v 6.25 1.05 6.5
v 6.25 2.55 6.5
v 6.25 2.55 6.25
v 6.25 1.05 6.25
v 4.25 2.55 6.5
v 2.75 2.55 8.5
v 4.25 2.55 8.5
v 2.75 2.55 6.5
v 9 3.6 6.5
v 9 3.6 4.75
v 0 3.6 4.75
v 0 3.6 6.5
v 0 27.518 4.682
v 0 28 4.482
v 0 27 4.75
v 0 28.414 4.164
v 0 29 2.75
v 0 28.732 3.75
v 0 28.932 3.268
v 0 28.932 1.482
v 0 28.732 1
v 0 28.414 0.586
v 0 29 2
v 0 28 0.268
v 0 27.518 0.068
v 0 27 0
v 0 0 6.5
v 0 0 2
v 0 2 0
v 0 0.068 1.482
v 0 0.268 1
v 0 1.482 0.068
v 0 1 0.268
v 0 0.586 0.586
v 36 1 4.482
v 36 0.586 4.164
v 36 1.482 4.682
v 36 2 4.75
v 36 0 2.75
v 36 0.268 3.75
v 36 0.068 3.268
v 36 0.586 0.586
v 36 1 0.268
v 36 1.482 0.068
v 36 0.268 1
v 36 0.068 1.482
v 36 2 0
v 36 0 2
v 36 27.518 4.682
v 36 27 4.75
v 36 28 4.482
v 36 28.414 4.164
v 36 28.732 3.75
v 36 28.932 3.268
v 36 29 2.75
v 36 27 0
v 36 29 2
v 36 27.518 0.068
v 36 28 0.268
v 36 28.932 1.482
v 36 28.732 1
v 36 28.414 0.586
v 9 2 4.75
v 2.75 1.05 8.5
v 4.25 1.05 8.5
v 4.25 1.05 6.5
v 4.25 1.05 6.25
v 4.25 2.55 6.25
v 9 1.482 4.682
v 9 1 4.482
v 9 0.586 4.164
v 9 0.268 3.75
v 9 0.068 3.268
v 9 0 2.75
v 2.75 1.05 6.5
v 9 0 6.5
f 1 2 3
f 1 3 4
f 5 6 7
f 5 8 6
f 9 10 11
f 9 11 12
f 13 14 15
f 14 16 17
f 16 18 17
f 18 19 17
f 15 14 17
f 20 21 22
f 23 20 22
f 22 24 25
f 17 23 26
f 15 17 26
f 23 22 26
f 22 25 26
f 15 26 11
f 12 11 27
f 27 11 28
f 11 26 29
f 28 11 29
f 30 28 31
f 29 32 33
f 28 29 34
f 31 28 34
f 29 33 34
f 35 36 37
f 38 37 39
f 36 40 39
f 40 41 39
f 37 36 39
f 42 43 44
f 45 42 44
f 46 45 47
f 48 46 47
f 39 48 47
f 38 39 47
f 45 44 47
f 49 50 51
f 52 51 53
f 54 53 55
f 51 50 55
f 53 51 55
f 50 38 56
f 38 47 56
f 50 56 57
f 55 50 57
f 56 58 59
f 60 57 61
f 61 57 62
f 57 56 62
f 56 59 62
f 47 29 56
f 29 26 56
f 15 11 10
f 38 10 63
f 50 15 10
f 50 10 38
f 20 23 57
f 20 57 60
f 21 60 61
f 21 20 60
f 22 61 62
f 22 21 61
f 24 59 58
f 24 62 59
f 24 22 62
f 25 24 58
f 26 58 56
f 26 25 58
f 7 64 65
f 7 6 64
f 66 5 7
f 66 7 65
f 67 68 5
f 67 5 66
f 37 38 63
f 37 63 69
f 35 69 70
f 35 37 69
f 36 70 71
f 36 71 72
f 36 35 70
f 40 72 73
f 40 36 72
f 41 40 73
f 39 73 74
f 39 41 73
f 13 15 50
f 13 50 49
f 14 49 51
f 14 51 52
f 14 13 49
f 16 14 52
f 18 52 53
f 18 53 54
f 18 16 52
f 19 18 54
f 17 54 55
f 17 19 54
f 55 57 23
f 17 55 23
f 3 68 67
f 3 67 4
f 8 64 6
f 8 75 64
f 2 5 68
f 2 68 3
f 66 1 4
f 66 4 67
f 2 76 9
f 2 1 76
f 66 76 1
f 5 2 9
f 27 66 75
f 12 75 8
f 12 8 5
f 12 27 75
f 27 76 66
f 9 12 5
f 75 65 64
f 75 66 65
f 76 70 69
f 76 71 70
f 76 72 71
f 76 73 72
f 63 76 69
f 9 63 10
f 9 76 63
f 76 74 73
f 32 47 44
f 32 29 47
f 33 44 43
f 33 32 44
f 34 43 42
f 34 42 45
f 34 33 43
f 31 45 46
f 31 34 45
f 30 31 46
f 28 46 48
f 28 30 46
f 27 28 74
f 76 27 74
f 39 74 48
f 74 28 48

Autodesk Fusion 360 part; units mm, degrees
sketch "Sketch1" plane through (0, 0, 0) normal (0, 1, 0) x (1, 0, 0)
box "BoxPrimitive1" add length 6.5 width 9 height 3.6 placed x (0, 0, 1) y (1, 0, 0) z (0, 1, 0) at (0, 0, 0)
sketch "Sketch2" plane through (0, 0, 6.5) normal (0, 0, 1) x (1, 0, 0)
  line L0 (0, 3.6) -> (0, 0)
  line L1 (0, 0) -> (9, 0)
  line L2 (9, 0) -> (9, 3.6)
  line L3 (9, 3.6) -> (0, 3.6)
  line L4 (4.5, 3.6) -> (4.5, 0)
  line L5 (4.5, 1.8) -> (6.25, 1.8)
  line L6 (6.25, 1.8) -> (6.25, 1.05)
  line L7 (6.25, 1.05) -> (2.75, 1.05)
  line L8 (2.75, 1.05) -> (2.75, 2.55)
  line L9 (2.75, 2.55) -> (6.25, 2.55)
  line L10 (6.25, 2.55) -> (6.25, 1.8)
  line L11 (2.75, 2.55) -> (4.25, 2.55)
  line L12 (4.25, 2.55) -> (4.25, 1.05)
  dimension "d6" = 1.75
  dimension "d7" = 0.75
  dimension "d8" = 3.5
  dimension "d9" = 1.5
  dimension "d10" = 3.5
  dimension "d11" = 1.5
extrude "Extrude1" add sketch "Sketch2" along normal blind 2 contours L7 L8 L9 L11 L12
extrude "Extrude2" cut sketch "Sketch2" against normal blind 0.25 contours L4 L5 L9 L10 | L4 L7 L9 L12 | L4 L5 L6 L7

Autodesk Fusion 360 part; units mm, degrees
sketch "Sketch1" plane through (0, 0, 0) normal (0, 0, 1) x (1, 0, 0)
  line L0 (0, 0) -> (36, 0)
  line L1 (36, 0) -> (36, 29)
  line L2 (36, 29) -> (0, 29)
  line L3 (0, 29) -> (0, 0)
  dimension "d1" = 36
  dimension "d2" = 29
extrude "Extrude1" add sketch "Sketch1" along normal blind 4.75
fillet "Fillet1" radius 2 4 edges at (18, 0, 4.75) (18, 0, 0) (18, 29, 4.75) (18, 29, 0)
